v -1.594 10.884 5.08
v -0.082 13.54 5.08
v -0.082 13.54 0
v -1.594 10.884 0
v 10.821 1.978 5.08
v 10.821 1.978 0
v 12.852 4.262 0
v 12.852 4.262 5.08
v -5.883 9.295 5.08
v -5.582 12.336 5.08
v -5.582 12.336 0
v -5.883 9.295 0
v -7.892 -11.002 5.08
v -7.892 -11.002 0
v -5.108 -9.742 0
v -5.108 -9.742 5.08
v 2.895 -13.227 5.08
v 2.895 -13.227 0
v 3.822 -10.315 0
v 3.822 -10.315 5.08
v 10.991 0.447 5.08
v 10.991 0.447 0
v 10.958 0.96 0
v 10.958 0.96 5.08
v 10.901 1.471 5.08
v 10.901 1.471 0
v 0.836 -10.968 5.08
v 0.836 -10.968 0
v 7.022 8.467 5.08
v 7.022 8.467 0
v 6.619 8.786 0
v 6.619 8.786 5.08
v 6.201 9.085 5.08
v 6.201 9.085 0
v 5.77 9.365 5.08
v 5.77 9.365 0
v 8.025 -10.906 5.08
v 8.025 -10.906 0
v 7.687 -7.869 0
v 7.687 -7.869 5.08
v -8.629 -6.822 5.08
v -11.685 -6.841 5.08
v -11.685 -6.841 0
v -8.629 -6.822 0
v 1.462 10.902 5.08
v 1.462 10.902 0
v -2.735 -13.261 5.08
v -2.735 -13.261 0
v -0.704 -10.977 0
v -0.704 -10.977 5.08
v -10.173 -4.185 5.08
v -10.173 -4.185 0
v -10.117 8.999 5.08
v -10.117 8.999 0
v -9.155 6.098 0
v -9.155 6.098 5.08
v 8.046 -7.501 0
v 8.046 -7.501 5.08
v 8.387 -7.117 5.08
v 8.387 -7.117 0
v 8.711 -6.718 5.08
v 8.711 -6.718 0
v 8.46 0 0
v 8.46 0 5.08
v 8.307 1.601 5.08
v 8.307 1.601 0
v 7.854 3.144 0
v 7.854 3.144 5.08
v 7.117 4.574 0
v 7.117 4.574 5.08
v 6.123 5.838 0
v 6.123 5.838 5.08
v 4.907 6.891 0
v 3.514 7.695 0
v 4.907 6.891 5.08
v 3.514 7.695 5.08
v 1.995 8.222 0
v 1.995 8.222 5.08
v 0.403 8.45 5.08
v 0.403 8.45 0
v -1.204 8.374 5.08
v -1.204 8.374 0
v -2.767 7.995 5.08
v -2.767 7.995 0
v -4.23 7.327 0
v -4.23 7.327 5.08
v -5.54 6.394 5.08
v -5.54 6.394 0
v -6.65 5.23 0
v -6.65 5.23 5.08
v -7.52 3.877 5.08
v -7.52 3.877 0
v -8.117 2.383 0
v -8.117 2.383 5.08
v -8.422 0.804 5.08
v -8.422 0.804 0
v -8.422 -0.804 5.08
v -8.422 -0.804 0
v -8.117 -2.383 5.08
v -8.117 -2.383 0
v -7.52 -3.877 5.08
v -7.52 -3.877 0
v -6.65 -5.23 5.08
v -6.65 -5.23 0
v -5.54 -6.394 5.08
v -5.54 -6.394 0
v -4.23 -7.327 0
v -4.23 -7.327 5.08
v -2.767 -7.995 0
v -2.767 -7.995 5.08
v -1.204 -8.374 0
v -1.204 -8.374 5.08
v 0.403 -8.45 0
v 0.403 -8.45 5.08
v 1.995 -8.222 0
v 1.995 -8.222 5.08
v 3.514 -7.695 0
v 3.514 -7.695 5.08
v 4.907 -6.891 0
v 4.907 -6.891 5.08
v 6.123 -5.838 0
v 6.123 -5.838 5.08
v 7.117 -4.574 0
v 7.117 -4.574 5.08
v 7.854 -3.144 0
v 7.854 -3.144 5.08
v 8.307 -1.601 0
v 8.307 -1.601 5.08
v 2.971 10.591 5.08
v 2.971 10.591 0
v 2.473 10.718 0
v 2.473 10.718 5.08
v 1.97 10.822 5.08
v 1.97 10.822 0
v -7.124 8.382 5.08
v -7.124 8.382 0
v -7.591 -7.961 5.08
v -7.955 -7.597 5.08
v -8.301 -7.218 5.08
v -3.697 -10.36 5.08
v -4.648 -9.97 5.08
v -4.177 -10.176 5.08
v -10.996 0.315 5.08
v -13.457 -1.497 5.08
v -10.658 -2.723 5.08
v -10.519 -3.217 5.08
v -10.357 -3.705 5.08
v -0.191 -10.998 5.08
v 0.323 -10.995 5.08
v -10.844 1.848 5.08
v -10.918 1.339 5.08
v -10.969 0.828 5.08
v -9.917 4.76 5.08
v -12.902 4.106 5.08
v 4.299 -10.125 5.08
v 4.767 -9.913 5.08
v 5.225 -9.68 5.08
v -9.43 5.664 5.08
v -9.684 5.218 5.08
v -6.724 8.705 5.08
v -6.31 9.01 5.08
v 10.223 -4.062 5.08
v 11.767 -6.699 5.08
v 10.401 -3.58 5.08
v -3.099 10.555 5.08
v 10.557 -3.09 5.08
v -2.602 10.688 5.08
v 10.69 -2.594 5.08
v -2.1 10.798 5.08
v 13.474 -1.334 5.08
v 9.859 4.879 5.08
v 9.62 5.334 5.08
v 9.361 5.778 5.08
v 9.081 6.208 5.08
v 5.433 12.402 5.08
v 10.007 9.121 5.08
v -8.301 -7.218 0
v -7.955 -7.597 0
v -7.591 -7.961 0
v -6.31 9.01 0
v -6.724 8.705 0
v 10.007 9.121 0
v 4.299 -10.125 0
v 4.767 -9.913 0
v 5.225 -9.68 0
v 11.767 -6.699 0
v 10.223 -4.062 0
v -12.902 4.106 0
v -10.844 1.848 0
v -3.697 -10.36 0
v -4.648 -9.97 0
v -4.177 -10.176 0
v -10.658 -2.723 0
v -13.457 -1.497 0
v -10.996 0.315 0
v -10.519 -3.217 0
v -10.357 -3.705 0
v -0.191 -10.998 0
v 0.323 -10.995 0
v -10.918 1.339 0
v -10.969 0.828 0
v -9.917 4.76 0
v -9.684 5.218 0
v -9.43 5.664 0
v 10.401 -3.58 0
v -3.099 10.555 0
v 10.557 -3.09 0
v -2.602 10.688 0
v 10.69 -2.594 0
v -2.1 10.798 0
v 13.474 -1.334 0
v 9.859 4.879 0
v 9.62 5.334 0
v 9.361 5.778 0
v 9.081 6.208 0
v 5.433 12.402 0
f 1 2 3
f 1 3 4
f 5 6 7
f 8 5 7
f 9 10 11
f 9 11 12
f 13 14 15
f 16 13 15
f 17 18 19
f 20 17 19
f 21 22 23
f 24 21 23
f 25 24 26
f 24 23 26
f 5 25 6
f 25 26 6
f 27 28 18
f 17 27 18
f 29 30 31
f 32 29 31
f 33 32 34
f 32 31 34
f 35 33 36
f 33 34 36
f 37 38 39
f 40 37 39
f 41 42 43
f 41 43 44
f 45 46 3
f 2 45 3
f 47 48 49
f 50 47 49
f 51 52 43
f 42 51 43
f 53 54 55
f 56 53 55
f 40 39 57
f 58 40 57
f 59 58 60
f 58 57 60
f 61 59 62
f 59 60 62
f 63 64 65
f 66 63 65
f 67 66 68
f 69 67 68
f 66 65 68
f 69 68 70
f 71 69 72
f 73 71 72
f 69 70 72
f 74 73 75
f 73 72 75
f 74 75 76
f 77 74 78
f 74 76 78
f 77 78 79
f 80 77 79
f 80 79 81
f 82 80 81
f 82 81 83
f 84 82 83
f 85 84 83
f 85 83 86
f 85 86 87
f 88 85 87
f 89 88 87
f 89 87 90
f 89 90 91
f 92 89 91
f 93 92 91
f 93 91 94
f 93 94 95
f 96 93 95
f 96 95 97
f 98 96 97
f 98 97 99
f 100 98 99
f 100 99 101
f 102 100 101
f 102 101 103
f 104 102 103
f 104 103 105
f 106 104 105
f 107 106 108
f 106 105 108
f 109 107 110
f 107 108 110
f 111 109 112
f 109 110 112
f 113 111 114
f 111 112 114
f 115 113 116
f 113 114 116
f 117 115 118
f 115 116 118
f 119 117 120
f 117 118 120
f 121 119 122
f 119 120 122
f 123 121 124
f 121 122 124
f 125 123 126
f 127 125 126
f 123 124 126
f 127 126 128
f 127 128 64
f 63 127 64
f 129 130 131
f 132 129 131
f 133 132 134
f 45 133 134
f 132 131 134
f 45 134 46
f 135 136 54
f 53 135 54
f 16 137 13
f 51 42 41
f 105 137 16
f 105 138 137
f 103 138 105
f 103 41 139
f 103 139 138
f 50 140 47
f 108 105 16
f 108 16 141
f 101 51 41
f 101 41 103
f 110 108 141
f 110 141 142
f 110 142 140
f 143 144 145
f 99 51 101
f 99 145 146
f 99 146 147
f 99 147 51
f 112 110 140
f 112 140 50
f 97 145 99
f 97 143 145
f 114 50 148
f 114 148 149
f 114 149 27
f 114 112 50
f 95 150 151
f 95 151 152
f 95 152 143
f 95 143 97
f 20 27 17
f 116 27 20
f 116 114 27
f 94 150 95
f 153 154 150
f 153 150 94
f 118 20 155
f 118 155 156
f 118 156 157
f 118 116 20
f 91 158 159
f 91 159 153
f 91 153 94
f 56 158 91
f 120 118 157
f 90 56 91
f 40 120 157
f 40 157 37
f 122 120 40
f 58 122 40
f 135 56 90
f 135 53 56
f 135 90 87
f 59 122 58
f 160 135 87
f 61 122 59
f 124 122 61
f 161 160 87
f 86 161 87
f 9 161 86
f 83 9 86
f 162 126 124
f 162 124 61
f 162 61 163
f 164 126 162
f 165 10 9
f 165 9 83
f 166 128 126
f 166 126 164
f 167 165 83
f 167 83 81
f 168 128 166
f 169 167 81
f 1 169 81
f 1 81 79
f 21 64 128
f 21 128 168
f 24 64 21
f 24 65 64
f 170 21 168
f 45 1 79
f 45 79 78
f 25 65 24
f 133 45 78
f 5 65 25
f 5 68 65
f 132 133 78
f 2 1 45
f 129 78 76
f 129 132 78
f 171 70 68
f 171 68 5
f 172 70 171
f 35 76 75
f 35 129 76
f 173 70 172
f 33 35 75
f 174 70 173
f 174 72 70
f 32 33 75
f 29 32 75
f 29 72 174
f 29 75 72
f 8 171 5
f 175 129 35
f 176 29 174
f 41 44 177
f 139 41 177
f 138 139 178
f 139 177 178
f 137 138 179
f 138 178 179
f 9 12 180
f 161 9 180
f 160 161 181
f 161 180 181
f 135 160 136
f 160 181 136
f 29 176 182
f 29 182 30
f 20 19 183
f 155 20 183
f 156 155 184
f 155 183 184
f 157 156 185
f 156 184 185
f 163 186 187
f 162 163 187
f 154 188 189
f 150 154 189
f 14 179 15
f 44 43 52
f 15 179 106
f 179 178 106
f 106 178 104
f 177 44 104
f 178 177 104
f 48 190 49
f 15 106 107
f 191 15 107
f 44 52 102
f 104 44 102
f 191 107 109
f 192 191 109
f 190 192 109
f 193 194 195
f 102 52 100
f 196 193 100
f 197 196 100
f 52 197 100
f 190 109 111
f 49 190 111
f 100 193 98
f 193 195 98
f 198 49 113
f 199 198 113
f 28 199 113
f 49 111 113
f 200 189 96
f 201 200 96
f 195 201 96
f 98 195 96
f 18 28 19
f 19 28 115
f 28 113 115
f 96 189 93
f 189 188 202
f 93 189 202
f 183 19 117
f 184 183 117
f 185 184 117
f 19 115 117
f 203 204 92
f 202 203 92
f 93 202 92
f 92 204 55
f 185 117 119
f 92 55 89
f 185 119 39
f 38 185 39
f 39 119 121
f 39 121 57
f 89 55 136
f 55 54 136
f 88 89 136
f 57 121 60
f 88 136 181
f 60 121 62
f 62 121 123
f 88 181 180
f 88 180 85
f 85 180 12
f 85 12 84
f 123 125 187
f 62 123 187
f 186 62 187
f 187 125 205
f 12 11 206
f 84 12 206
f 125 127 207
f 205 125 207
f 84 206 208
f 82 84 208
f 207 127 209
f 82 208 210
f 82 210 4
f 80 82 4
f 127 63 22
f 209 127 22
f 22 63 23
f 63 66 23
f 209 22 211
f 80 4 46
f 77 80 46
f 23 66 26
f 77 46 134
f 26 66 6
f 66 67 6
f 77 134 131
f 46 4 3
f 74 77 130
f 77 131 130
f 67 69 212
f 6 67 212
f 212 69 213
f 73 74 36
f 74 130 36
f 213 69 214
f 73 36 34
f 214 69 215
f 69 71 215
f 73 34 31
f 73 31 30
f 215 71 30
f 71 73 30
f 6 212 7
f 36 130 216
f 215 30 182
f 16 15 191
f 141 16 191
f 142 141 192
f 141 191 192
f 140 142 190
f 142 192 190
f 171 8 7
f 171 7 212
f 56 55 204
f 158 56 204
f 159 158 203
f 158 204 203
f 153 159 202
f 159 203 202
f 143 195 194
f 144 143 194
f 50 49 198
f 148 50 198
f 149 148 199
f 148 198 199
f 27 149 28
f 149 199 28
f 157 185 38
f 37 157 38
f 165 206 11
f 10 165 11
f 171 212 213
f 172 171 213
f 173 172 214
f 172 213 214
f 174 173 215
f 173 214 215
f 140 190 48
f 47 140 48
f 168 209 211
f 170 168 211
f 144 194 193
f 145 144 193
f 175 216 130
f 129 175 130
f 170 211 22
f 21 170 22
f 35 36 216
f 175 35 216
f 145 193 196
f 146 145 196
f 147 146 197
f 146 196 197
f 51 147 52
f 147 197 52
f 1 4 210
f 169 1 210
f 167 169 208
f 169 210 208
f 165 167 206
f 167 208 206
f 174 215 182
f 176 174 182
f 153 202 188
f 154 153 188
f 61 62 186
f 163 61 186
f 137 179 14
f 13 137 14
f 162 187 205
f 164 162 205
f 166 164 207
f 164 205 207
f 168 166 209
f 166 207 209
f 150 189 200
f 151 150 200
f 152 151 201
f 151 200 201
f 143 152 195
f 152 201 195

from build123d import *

# Parameters (mm, degrees)
F1_DEPTH = 5.08
F2_R     = 8.460003
F3_DEPTH = 25.4


with BuildPart() as f1:
    # F0 (on Top) → F1 (new body)
    with BuildSketch(Plane.XY):
        with BuildLine():
            ThreePointArc((10.689795, -2.593908), (10.922176, -1.306196), (11.000003, 0))
            ThreePointArc((11.000003, 0), (10.997729, 0.223701), (10.990905, 0.447309))
            ThreePointArc((10.990905, 0.447309), (10.93261, 1.215778), (10.820651, 1.978278))
            ThreePointArc((10.820651, 1.978278), (10.440932, 3.462227), (9.858754, 4.879041))
            ThreePointArc((9.858754, 4.879041), (9.492935, 5.557361), (9.080518, 6.208402))
            ThreePointArc((9.080518, 6.208402), (8.130051, 7.409612), (7.021935, 8.467143))
            ThreePointArc((7.021935, 8.467143), (6.411845, 8.938027), (5.770282, 9.365037))
            ThreePointArc((5.770282, 9.365037), (4.413411, 10.075807), (2.97096, 10.591198))
            ThreePointArc((2.97096, 10.591198), (2.222089, 10.773226), (1.462311, 10.902372))
            ThreePointArc((1.462311, 10.902372), (-0.066349, 10.999803), (-1.593721, 10.883939))
            ThreePointArc((-1.593721, 10.883939), (-2.351886, 10.745637), (-3.098507, 10.554588))
            ThreePointArc((-3.098507, 10.554588), (-4.534636, 10.021834), (-5.882834, 9.294748))
            ThreePointArc((-5.882834, 9.294748), (-6.519199, 8.860029), (-7.123565, 8.38182))
            ThreePointArc((-7.123565, 8.38182), (-8.218843, 7.310998), (-9.154751, 6.098411))
            ThreePointArc((-9.154751, 6.098411), (-9.559283, 5.442442), (-9.916893, 4.759758))
            ThreePointArc((-9.916893, 4.759758), (-10.481937, 3.336025), (-10.843728, 1.847603))
            ThreePointArc((-10.843728, 1.847603), (-10.946481, 1.083807), (-10.995501, 0.314692))
            ThreePointArc((-10.995501, 0.314692), (-10.93261, -1.215778), (-10.657726, -2.722672))
            ThreePointArc((-10.657726, -2.722672), (-10.440932, -3.462227), (-10.172887, -4.184788))
            ThreePointArc((-10.172887, -4.184788), (-9.492935, -5.557361), (-8.628907, -6.822173))
            ThreePointArc((-8.628907, -6.822173), (-8.130051, -7.409612), (-7.591288, -7.96068))
            ThreePointArc((-7.591288, -7.96068), (-6.411845, -8.938027), (-5.108071, -9.742058))
            ThreePointArc((-5.108071, -9.742058), (-4.413411, -10.075807), (-3.697086, -10.360098))
            ThreePointArc((-3.697086, -10.360098), (-2.222089, -10.773226), (-0.704003, -10.977452))
            ThreePointArc((-0.704003, -10.977452), (0.066349, -10.999803), (0.836375, -10.968161))
            ThreePointArc((0.836375, -10.968161), (2.351886, -10.745637), (3.821793, -10.314745))
            ThreePointArc((3.821793, -10.314745), (4.534636, -10.021834), (5.225219, -9.679729))
            ThreePointArc((5.225219, -9.679729), (6.519199, -8.860029), (7.686767, -7.868526))
            ThreePointArc((7.686767, -7.868526), (8.218843, -7.310998), (8.710576, -6.717584))
            ThreePointArc((8.710576, -6.717584), (9.559283, -5.442442), (10.222628, -4.061766))
            ThreePointArc((10.222628, -4.061766), (10.481937, -3.336025), (10.689795, -2.593908))
        make_face()
        with BuildLine():
            ThreePointArc((10.990905, 0.447309), (10.997729, 0.223701), (11.000003, 0))
            ThreePointArc((11.000003, 0), (10.922176, -1.306196), (10.689795, -2.593908))
            Line((10.689795, -2.593908), (13.474122, -1.334068))
            Line((13.474122, -1.334068), (10.990905, 0.447309))
        make_face()
        with BuildLine():
            ThreePointArc((9.858754, 4.879041), (10.440932, 3.462227), (10.820651, 1.978278))
            Line((10.820651, 1.978278), (12.851837, 4.261687))
            Line((12.851837, 4.261687), (9.858754, 4.879041))
        make_face()
        with BuildLine():
            Line((11.766608, -6.699151), (10.222628, -4.061766))
            ThreePointArc((10.222628, -4.061766), (9.559283, -5.442442), (8.710576, -6.717584))
            Line((8.710576, -6.717584), (11.766608, -6.699151))
        make_face()
        with BuildLine():
            ThreePointArc((7.021935, 8.467143), (8.130051, 7.409612), (9.080518, 6.208402))
            Line((9.080518, 6.208402), (10.007353, 9.120558))
            Line((10.007353, 9.120558), (7.021935, 8.467143))
        make_face()
        with BuildLine():
            Line((8.024541, -10.90589), (7.686767, -7.868526))
            ThreePointArc((7.686767, -7.868526), (6.519199, -8.860029), (5.225219, -9.679729))
            Line((5.225219, -9.679729), (8.024541, -10.90589))
        make_face()
        with BuildLine():
            ThreePointArc((2.97096, 10.591198), (4.413411, 10.075807), (5.770282, 9.365037))
            Line((5.770282, 9.365037), (5.432507, 12.402401))
            Line((5.432507, 12.402401), (2.97096, 10.591198))
        make_face()
        with BuildLine():
            Line((2.894958, -13.226901), (3.821793, -10.314745))
            ThreePointArc((3.821793, -10.314745), (2.351886, -10.745637), (0.836375, -10.968161))
            Line((0.836375, -10.968161), (2.894958, -13.226901))
        make_face()
        with BuildLine():
            ThreePointArc((-1.593721, 10.883939), (-0.066349, 10.999803), (1.462311, 10.902372))
            Line((1.462311, 10.902372), (-0.081669, 13.539757))
            Line((-0.081669, 13.539757), (-1.593721, 10.883939))
        make_face()
        with BuildLine():
            Line((-2.735189, -13.260861), (-0.704003, -10.977452))
            ThreePointArc((-0.704003, -10.977452), (-2.222089, -10.773226), (-3.697086, -10.360098))
            Line((-3.697086, -10.360098), (-2.735189, -13.260861))
        make_face()
        with BuildLine():
            ThreePointArc((-5.882834, 9.294748), (-4.534636, 10.021834), (-3.098507, 10.554588))
            Line((-3.098507, 10.554588), (-5.581724, 12.335966))
            Line((-5.581724, 12.335966), (-5.882834, 9.294748))
        make_face()
        with BuildLine():
            Line((-7.892398, -11.001898), (-5.108071, -9.742058))
            ThreePointArc((-5.108071, -9.742058), (-6.411845, -8.938027), (-7.591288, -7.96068))
            Line((-7.591288, -7.96068), (-7.892398, -11.001898))
        make_face()
        with BuildLine():
            ThreePointArc((-9.154751, 6.098411), (-8.218843, 7.310998), (-7.123565, 8.38182))
            Line((-7.123565, 8.38182), (-10.116648, 8.999174))
            Line((-10.116648, 8.999174), (-9.154751, 6.098411))
        make_face()
        with BuildLine():
            Line((-11.684939, -6.840606), (-8.628907, -6.822173))
            ThreePointArc((-8.628907, -6.822173), (-9.492935, -5.557361), (-10.172887, -4.184788))
            Line((-10.172887, -4.184788), (-11.684939, -6.840606))
        make_face()
        with BuildLine():
            ThreePointArc((-10.843728, 1.847603), (-10.481937, 3.336025), (-9.916893, 4.759758))
            Line((-9.916893, 4.759758), (-12.902311, 4.106343))
            Line((-12.902311, 4.106343), (-10.843728, 1.847603))
        make_face()
        with BuildLine():
            Line((-13.457048, -1.496512), (-10.657726, -2.722672))
            ThreePointArc((-10.657726, -2.722672), (-10.93261, -1.215778), (-10.995501, 0.314692))
            Line((-10.995501, 0.314692), (-13.457048, -1.496512))
        make_face()
    extrude(amount=F1_DEPTH)

    # F2 (on face) → F3 (cut)
    with BuildSketch(Plane.XY.offset(5.08)):
        Circle(F2_R)
    extrude(amount=-F3_DEPTH, mode=Mode.SUBTRACT)


solid = f1.part
